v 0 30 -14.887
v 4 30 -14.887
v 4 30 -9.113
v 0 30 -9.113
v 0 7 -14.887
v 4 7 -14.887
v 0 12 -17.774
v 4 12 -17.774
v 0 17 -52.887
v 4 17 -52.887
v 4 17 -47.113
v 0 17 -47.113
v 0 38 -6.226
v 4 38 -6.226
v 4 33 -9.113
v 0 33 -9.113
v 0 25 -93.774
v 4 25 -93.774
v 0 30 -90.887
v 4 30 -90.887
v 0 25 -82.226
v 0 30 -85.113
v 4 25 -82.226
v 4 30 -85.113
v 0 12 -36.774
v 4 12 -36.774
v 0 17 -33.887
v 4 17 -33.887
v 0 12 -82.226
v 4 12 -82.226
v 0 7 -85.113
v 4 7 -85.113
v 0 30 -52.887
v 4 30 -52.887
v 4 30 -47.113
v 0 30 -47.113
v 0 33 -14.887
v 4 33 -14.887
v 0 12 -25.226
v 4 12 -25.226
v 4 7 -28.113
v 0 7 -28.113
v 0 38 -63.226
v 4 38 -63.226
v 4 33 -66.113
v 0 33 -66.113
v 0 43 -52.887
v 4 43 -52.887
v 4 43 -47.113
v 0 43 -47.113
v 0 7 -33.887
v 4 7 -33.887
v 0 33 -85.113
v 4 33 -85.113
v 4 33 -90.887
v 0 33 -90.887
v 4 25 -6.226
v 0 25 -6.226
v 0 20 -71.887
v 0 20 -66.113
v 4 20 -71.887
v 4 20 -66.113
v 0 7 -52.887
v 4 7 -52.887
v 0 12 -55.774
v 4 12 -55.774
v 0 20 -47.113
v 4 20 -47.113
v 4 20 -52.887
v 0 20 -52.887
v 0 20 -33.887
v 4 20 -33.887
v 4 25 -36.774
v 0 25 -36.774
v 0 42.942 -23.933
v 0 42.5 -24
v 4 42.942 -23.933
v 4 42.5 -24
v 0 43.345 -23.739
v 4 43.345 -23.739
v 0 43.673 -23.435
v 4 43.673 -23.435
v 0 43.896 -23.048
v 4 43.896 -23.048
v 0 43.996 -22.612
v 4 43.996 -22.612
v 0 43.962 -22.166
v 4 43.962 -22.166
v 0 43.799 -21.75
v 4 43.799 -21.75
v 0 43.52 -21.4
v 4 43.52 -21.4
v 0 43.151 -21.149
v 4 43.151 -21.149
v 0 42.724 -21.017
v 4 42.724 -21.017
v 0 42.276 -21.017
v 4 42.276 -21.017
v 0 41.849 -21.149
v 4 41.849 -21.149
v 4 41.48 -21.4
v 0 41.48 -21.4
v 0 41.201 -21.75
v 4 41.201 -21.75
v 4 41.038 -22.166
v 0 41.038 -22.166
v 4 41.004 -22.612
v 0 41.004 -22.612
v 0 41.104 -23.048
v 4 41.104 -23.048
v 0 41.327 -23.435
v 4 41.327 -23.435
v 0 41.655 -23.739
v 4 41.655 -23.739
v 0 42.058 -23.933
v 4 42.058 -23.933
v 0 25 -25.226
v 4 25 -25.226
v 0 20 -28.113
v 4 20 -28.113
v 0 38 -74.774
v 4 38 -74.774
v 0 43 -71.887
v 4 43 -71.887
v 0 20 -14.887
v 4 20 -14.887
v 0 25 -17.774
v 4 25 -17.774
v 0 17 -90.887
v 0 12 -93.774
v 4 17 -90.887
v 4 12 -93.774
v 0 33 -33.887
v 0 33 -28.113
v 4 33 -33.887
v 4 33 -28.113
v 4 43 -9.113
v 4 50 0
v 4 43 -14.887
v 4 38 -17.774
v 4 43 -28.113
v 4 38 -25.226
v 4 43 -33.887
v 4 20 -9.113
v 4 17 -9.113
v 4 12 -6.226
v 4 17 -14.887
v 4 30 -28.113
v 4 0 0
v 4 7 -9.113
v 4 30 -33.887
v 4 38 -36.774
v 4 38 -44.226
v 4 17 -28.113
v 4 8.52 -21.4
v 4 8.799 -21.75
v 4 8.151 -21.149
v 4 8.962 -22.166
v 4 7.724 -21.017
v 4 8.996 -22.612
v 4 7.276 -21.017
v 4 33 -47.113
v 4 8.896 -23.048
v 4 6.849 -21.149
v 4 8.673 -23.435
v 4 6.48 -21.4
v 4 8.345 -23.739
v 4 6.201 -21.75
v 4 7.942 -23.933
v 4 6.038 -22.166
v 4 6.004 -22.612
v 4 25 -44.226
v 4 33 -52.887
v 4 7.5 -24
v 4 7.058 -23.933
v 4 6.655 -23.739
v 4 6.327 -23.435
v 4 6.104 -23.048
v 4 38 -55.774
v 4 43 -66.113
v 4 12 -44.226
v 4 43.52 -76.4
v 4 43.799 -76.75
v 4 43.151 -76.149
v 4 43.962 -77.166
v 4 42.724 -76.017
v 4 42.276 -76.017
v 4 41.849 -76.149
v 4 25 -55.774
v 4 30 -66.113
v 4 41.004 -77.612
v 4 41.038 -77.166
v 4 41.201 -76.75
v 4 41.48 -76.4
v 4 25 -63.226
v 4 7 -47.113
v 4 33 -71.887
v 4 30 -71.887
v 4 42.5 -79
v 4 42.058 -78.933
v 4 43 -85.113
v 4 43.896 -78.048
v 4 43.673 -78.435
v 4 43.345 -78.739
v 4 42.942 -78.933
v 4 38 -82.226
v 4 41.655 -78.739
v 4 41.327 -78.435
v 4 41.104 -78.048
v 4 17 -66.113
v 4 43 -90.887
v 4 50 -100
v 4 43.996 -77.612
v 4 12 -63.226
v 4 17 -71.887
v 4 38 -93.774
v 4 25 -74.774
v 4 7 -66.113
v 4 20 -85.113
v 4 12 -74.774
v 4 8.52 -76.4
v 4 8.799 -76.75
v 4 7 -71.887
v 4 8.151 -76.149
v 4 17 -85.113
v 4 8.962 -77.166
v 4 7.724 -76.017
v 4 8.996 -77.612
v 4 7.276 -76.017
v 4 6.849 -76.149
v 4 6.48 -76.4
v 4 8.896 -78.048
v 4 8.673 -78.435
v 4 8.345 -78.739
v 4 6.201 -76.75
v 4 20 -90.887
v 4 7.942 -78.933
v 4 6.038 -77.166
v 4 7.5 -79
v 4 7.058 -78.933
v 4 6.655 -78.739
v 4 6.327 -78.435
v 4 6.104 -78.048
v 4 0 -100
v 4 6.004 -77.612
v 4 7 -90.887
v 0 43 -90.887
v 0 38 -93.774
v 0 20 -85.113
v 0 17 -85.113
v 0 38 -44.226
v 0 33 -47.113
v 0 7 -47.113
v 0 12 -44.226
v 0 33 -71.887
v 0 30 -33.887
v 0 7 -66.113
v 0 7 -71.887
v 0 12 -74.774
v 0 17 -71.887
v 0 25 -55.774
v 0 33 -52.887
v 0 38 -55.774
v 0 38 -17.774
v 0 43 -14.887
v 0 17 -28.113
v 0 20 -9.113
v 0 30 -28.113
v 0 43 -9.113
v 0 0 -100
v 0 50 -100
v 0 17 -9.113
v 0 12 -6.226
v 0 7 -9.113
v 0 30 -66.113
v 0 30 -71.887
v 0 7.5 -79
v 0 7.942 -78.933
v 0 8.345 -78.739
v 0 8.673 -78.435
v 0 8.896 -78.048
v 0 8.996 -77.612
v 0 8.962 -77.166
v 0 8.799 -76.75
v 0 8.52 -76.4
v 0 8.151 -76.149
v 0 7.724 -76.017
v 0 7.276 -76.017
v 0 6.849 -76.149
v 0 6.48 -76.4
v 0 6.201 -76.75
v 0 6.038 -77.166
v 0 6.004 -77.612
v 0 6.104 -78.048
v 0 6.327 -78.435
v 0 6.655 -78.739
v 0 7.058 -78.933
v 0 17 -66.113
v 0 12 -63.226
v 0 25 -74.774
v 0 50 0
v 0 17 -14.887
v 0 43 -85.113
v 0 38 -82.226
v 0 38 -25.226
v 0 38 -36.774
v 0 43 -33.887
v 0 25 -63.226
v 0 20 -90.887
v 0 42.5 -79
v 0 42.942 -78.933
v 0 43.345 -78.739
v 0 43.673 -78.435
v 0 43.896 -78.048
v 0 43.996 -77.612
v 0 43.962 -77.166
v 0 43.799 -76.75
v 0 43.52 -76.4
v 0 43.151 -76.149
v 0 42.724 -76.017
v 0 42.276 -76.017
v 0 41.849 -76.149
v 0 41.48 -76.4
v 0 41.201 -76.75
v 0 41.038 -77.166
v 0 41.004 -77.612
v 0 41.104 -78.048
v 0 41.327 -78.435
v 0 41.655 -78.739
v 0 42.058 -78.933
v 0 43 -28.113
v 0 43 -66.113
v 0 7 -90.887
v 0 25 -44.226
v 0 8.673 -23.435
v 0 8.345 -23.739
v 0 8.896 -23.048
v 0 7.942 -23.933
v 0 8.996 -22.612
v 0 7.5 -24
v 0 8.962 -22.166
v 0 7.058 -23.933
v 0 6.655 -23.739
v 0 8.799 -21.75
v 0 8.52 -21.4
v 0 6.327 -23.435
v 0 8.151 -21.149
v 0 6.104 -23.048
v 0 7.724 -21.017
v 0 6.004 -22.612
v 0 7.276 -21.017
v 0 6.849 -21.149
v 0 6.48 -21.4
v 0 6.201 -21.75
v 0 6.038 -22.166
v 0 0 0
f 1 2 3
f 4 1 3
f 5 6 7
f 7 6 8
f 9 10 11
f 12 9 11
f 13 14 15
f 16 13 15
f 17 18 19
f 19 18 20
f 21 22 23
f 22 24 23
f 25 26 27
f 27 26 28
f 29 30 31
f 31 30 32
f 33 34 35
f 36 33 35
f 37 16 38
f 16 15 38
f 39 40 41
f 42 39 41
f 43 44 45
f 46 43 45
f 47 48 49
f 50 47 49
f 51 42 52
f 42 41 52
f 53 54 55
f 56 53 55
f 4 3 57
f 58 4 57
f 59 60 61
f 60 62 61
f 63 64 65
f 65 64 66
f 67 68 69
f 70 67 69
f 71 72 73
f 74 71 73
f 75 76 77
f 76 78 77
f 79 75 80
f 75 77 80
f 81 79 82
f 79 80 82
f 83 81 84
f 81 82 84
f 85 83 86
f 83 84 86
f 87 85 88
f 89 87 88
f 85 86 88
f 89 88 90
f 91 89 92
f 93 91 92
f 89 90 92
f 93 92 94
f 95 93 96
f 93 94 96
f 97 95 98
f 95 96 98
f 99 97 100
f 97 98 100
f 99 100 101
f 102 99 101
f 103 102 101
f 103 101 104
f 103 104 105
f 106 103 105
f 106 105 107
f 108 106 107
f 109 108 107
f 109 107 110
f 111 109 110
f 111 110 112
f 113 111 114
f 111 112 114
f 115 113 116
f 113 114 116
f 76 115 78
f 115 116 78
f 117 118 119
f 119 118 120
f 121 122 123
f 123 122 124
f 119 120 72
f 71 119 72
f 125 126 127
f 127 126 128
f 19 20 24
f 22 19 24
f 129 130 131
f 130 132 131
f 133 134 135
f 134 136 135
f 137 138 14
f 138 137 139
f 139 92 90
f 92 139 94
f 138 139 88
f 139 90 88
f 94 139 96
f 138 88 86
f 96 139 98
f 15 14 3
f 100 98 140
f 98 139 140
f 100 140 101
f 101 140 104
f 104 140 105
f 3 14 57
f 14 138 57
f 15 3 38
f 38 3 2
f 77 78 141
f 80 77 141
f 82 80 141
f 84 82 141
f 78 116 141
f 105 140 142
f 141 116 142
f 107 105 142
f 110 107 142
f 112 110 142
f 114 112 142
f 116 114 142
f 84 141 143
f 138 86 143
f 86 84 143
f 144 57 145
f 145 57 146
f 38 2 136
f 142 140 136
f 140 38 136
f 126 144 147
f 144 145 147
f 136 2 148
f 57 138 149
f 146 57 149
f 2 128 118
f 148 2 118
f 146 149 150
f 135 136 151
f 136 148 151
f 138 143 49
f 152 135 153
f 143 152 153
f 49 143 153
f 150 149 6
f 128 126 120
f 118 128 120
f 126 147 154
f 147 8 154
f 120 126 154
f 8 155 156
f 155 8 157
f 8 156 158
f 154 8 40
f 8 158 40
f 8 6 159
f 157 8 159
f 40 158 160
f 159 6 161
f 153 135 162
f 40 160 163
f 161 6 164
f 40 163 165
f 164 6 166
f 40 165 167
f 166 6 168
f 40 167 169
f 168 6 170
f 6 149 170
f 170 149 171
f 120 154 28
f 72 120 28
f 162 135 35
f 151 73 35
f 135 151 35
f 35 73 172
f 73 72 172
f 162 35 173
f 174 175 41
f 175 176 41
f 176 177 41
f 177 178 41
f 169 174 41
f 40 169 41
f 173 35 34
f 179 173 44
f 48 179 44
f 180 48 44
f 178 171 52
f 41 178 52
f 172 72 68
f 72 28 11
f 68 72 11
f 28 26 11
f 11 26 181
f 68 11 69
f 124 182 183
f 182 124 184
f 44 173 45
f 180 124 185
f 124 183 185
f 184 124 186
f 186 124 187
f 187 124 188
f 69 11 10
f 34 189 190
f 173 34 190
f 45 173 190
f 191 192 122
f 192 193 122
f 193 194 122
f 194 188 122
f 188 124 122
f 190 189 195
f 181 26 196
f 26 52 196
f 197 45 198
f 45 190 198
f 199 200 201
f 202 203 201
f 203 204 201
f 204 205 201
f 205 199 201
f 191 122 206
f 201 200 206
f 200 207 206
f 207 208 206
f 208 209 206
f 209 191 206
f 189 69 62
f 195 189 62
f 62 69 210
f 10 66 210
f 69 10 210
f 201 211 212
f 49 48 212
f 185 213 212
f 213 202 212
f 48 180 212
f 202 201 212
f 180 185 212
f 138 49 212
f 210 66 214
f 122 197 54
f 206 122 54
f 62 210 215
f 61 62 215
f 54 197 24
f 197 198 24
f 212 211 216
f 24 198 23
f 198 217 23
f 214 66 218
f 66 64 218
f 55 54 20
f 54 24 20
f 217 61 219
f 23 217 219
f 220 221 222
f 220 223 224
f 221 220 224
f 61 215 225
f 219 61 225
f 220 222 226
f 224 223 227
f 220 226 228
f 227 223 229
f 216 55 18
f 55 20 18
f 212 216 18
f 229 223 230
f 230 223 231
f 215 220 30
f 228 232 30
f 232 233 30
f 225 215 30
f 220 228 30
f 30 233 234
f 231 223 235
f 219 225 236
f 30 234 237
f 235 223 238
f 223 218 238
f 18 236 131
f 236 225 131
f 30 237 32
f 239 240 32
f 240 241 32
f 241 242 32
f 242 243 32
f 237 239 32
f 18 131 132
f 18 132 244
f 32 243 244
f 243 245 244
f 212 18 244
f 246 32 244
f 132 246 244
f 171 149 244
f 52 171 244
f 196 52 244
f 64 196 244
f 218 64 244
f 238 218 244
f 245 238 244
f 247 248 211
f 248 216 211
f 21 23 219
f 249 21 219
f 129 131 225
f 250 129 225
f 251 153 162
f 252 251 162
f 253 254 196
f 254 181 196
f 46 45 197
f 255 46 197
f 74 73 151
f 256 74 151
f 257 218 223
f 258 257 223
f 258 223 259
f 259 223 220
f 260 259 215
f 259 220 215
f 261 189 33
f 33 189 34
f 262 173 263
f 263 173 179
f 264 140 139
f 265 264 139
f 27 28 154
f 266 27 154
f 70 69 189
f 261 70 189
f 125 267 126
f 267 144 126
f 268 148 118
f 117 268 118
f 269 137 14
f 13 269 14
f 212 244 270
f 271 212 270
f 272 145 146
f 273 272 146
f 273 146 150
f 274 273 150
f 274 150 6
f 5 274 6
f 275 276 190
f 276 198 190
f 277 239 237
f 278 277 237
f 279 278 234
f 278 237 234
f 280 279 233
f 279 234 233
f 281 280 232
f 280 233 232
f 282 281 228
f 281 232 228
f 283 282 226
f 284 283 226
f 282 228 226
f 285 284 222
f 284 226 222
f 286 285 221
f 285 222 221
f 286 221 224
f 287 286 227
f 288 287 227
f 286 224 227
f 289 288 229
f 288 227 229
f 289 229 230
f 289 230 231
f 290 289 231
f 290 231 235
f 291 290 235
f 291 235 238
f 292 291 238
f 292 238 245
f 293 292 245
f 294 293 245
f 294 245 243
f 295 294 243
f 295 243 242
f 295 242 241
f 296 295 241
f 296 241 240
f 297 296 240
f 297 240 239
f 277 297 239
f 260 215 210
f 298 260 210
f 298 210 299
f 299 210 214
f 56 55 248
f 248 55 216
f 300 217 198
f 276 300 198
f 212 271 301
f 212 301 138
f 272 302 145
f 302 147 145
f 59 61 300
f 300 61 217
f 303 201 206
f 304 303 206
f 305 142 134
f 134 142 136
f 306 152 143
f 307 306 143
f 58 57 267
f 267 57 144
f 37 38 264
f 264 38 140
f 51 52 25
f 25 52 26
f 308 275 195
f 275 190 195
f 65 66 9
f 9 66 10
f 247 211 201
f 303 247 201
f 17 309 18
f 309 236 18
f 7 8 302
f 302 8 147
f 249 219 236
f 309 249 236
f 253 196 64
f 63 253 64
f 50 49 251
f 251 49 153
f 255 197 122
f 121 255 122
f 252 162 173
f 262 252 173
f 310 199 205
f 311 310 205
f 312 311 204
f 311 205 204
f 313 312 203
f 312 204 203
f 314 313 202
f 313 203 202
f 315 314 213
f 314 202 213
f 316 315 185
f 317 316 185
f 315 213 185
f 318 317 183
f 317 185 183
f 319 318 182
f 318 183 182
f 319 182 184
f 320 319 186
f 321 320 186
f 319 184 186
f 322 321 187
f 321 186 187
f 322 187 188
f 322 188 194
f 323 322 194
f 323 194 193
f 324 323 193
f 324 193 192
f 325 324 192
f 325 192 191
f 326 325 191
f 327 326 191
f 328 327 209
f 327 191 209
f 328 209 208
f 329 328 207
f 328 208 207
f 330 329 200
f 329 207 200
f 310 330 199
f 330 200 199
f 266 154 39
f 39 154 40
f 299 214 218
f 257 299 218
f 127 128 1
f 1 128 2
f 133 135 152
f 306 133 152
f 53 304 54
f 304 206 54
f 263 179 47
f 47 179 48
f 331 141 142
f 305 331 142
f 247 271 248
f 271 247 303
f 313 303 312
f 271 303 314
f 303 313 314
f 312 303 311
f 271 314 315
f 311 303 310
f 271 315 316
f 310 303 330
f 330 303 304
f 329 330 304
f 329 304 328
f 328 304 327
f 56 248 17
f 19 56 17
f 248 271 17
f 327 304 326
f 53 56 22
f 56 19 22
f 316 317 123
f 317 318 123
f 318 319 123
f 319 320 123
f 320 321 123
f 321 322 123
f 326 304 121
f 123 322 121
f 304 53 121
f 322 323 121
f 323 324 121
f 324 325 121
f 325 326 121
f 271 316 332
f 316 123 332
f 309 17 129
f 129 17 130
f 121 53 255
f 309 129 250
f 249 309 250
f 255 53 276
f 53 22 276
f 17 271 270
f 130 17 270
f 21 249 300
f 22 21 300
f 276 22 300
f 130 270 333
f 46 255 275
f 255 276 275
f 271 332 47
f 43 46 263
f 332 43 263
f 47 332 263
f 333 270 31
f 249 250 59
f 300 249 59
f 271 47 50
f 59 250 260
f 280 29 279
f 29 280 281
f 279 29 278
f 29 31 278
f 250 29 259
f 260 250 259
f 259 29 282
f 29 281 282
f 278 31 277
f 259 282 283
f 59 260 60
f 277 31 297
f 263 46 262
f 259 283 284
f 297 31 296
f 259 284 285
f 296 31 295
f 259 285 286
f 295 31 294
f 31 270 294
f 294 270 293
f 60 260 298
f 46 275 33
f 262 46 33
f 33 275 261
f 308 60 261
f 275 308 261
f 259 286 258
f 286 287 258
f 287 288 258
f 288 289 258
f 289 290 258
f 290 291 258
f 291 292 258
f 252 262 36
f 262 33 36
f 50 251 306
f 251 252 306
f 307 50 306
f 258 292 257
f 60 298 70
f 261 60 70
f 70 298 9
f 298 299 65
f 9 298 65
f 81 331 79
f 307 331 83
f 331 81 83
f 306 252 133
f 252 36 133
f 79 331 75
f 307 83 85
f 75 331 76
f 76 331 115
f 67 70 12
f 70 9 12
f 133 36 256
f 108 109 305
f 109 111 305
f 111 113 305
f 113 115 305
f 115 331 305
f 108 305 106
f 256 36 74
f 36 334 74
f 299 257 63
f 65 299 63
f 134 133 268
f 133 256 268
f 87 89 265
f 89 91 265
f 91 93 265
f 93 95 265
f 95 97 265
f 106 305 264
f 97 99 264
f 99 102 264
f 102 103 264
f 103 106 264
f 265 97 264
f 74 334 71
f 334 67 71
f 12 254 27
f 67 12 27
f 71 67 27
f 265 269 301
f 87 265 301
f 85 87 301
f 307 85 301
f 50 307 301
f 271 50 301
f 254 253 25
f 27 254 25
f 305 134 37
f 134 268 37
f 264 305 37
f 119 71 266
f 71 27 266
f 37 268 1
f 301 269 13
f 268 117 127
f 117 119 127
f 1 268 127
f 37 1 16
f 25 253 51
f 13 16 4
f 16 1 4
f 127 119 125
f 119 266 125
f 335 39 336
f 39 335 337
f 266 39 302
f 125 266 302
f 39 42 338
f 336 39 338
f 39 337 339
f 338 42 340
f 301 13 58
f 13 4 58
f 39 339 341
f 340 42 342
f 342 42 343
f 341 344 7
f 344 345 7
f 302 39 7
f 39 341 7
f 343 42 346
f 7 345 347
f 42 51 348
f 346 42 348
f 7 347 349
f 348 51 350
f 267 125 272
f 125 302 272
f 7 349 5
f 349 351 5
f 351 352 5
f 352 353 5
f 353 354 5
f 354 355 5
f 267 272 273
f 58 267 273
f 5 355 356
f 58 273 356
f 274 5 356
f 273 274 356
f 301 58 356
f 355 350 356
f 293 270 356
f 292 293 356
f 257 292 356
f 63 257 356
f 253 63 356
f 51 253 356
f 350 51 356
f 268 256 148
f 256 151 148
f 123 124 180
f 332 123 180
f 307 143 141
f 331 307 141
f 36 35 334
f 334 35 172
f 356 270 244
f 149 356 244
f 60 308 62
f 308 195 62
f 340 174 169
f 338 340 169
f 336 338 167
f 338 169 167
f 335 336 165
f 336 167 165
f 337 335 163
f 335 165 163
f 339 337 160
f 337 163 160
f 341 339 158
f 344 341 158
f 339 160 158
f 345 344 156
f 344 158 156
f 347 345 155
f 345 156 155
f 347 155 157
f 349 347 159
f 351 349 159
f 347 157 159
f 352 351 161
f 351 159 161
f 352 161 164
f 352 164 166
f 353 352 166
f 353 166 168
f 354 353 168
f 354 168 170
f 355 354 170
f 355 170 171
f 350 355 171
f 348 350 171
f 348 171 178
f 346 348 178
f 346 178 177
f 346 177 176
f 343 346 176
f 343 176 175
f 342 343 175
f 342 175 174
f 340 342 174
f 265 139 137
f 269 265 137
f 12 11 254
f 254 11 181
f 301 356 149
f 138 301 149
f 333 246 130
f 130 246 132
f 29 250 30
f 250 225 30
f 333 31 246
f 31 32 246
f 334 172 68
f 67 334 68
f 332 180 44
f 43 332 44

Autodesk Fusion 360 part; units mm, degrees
sketch "Boceto1" plane through (0, 0, 0) normal (0, 1, 0) x (1, 0, 0)
  line L0 (0, 0) -> (4, 0)
  line L1 (4, 0) -> (4, 100)
  line L2 (4, 100) -> (0, 100)
  line L3 (0, 100) -> (0, 0)
  dimension "d1" = 4
  dimension "d2" = 100
extrude "Extruir1" add sketch "Boceto1" along normal blind 50
sketch "Boceto2" plane through (4, 0, 0) normal (1, 0, 0) x (0, 0, -1)
  line L0 (0, 0) -> (100, 0)
  line L1 (100, 0) -> (100, 50)
  line L2 (100, 50) -> (0, 50)
  line L3 (0, 50) -> (0, 0)
  line L4 (0, 0) -> (0, 7.5)
  line L5 (0, 7.5) -> (22.5, 7.5)
  line L6 (22.5, 7.5) -> (77.5, 7.5)
  line L7 (77.5, 7.5) -> (77.5, 42.5)
  line L8 (77.5, 42.5) -> (22.5, 42.5)
  circle A0 centre (22.5, 42.5) radius 1.5
  circle A1 centre (77.5, 42.5) radius 1.5
  circle A2 centre (22.5, 7.5) radius 1.5
  circle A3 centre (77.5, 7.5) radius 1.5
  line L9 (0, 50) -> (4, 50)
  line L10 (4, 50) -> (4, 46)
  line L11 (4, 46) -> (96, 46)
  line L12 (96, 46) -> (96, 4)
  line L13 (96, 4) -> (4, 4)
  line L14 (4, 4) -> (4, 46)
  line L15 (50, 46) -> (50, 25)
  line L16 (47.1132, 30) -> (44.2265, 25)
  line L17 (44.2265, 25) -> (47.1132, 20)
  line L18 (47.1132, 20) -> (52.8868, 20)
  line L19 (52.8868, 20) -> (55.7735, 25)
  line L20 (55.7735, 25) -> (52.8868, 30)
  line L21 (52.8868, 30) -> (47.1132, 30)
  line L22 (9.1132, 30) -> (6.2265, 25)
  line L23 (9.1132, 20) -> (14.8868, 20)
  line L24 (14.8868, 20) -> (17.7735, 25)
  line L25 (6.2265, 25) -> (9.1132, 20)
  line L26 (17.7735, 25) -> (14.8868, 30)
  line L27 (14.8868, 30) -> (9.1132, 30)
  line L28 (28.1132, 30) -> (25.2265, 25)
  line L29 (28.1132, 20) -> (33.8868, 20)
  line L30 (33.8868, 20) -> (36.7735, 25)
  line L31 (25.2265, 25) -> (28.1132, 20)
  line L32 (36.7735, 25) -> (33.8868, 30)
  line L33 (33.8868, 30) -> (28.1132, 30)
  line L34 (66.1132, 30) -> (63.2265, 25)
  line L35 (66.1132, 20) -> (71.8868, 20)
  line L36 (71.8868, 20) -> (74.7735, 25)
  line L37 (63.2265, 25) -> (66.1132, 20)
  line L38 (74.7735, 25) -> (71.8868, 30)
  line L39 (71.8868, 30) -> (66.1132, 30)
  line L40 (85.1132, 30) -> (82.2265, 25)
  line L41 (85.1132, 20) -> (90.8868, 20)
  line L42 (90.8868, 20) -> (93.7735, 25)
  line L43 (82.2265, 25) -> (85.1132, 20)
  line L44 (93.7735, 25) -> (90.8868, 30)
  line L45 (90.8868, 30) -> (85.1132, 30)
  line L46 (17.7735, 12) -> (14.8868, 17)
  line L47 (85.1132, 17) -> (82.2265, 12)
  line L48 (14.8868, 17) -> (9.1132, 17)
  line L49 (90.8868, 7) -> (93.7735, 12)
  line L50 (47.1132, 7) -> (52.8868, 7)
  line L51 (28.1132, 17) -> (25.2265, 12)
  line L52 (47.1132, 17) -> (44.2265, 12)
  line L53 (85.1132, 7) -> (90.8868, 7)
  line L54 (52.8868, 7) -> (55.7735, 12)
  line L55 (63.2265, 12) -> (66.1132, 7)
  line L56 (9.1132, 7) -> (14.8868, 7)
  line L57 (14.8868, 7) -> (17.7735, 12)
  line L58 (52.8868, 17) -> (47.1132, 17)
  line L59 (74.7735, 12) -> (71.8868, 17)
  line L60 (28.1132, 7) -> (33.8868, 7)
  line L61 (36.7735, 12) -> (33.8868, 17)
  line L62 (82.2265, 12) -> (85.1132, 7)
  line L63 (71.8868, 17) -> (66.1132, 17)
  line L64 (33.8868, 17) -> (28.1132, 17)
  line L65 (93.7735, 12) -> (90.8868, 17)
  line L66 (9.1132, 17) -> (6.2265, 12)
  line L67 (33.8868, 7) -> (36.7735, 12)
  line L68 (25.2265, 12) -> (28.1132, 7)
  line L69 (71.8868, 7) -> (74.7735, 12)
  line L70 (55.7735, 12) -> (52.8868, 17)
  line L71 (6.2265, 12) -> (9.1132, 7)
  line L72 (66.1132, 7) -> (71.8868, 7)
  line L73 (66.1132, 17) -> (63.2265, 12)
  line L74 (44.2265, 12) -> (47.1132, 7)
  line L75 (90.8868, 17) -> (85.1132, 17)
  line L76 (17.7735, 38) -> (14.8868, 43)
  line L77 (85.1132, 43) -> (82.2265, 38)
  line L78 (14.8868, 43) -> (9.1132, 43)
  line L79 (90.8868, 33) -> (93.7735, 38)
  line L80 (47.1132, 33) -> (52.8868, 33)
  line L81 (28.1132, 43) -> (25.2265, 38)
  line L82 (47.1132, 43) -> (44.2265, 38)
  line L83 (85.1132, 33) -> (90.8868, 33)
  line L84 (52.8868, 33) -> (55.7735, 38)
  line L85 (63.2265, 38) -> (66.1132, 33)
  line L86 (9.1132, 33) -> (14.8868, 33)
  line L87 (14.8868, 33) -> (17.7735, 38)
  line L88 (52.8868, 43) -> (47.1132, 43)
  line L89 (74.7735, 38) -> (71.8868, 43)
  line L90 (28.1132, 33) -> (33.8868, 33)
  line L91 (36.7735, 38) -> (33.8868, 43)
  line L92 (82.2265, 38) -> (85.1132, 33)
  line L93 (71.8868, 43) -> (66.1132, 43)
  line L94 (33.8868, 43) -> (28.1132, 43)
  line L95 (93.7735, 38) -> (90.8868, 43)
  line L96 (9.1132, 43) -> (6.2265, 38)
  line L97 (33.8868, 33) -> (36.7735, 38)
  line L98 (25.2265, 38) -> (28.1132, 33)
  line L99 (71.8868, 33) -> (74.7735, 38)
  line L100 (55.7735, 38) -> (52.8868, 43)
  line L101 (6.2265, 38) -> (9.1132, 33)
  line L102 (66.1132, 33) -> (71.8868, 33)
  line L103 (66.1132, 43) -> (63.2265, 38)
  line L104 (44.2265, 38) -> (47.1132, 33)
  line L105 (90.8868, 43) -> (85.1132, 43)
  point P0 (50, 25)
  point P1 (12, 25)
  point P2 (12, 25)
  point P3 (31, 25)
  point P4 (31, 25)
  point P5 (69, 25)
  point P6 (69, 25)
  point P7 (88, 25)
  point P8 (88, 25)
  point P9 (12, 12)
  point P10 (50, 12)
  point P11 (69, 12)
  point P12 (31, 12)
  point P13 (88, 12)
  point P14 (50, 12)
  point P15 (31, 12)
  point P16 (88, 12)
  point P17 (69, 12)
  point P18 (12, 12)
  point P19 (12, 38)
  point P20 (50, 38)
  point P21 (69, 38)
  point P22 (31, 38)
  point P23 (88, 38)
  point P24 (50, 38)
  point P25 (31, 38)
  point P26 (88, 38)
  point P27 (69, 38)
  point P28 (12, 38)
  dimension "d5" = 7.5
  dimension "d6" = 22.5
  dimension "d7" = 55
  dimension "d8" = 35
  dimension "d9" = 3
  dimension "d10" = 3
  dimension "d11" = 3
  dimension "d12" = 3
  dimension "d13" = 4
  dimension "d14" = 4
  dimension "d15" = 92
  dimension "d16" = 42
  dimension "d17" = 5
  dimension "d20" = 38
  dimension "d21" = 0
  dimension "d24" = 0
  dimension "d25" = 13
extrude "Extruir2" cut sketch "Boceto2" against normal blind 13 contours L16 L17 L18 L19 L20 L21 | A0 | L8 L81 L90 L91 L97 L98 | L8 L81 L91 L94 | L5 L46 L48 L57 L66 L71 | L5 L56 L57 L71 | L5 L6 A2 | L5 L6 A2 | L8 L15 L88 L100 | L8 L15 L82 L88 | L8 L15 L80 L82 L104 | L8 L15 L80 L84 L100 | L6 L51 L61 L64 L67 L68 | L6 L60 L67 L68 | L8 L89 L93 L103 | L8 L85 L89 L99 L102 L103 | L6 L52 L54 L58 L70 L74 | L6 L50 L54 L74 | L7 L8 A1 | L7 L8 A1 | L6 L55 L59 L63 L69 L73 | L6 L55 L69 L72 | L6 L7 A3 | L6 L7 A3 | L22 L23 L24 L25 L26 L27 | L28 L29 L30 L31 L32 L33 | L34 L35 L36 L37 L38 L39 | L40 L41 L42 L43 L44 L45 | L47 L49 L53 L62 L65 L75 | L76 L78 L86 L87 L96 L101 | L77 L79 L83 L92 L95 L105
sketch "Boceto3" plane through (4, 0, 0) normal (1, 0, 0) x (0, 0, -1)
  line L0 (52.8868, 7) -> (47.1132, 7)
  line L1 (47.1132, 7) -> (44.2265, 12)
  line L2 (44.2265, 12) -> (47.1132, 17)
  line L3 (47.1132, 17) -> (52.8868, 17)
  line L4 (52.8868, 17) -> (55.7735, 12)
  line L5 (55.7735, 12) -> (52.8868, 7)
  line L6 (14.8868, 33) -> (9.1132, 33)
  line L7 (9.1132, 33) -> (6.2265, 38)
  line L8 (6.2265, 38) -> (9.1132, 43)
  line L9 (9.1132, 43) -> (14.8868, 43)
  line L10 (14.8868, 43) -> (17.7735, 38)
  line L11 (17.7735, 38) -> (14.8868, 33)
  line L12 (63.2265, 25) -> (66.1132, 30)
  line L13 (66.1132, 30) -> (71.8868, 30)
  line L14 (71.8868, 30) -> (74.7735, 25)
  line L15 (74.7735, 25) -> (71.8868, 20)
  line L16 (71.8868, 20) -> (66.1132, 20)
  line L17 (66.1132, 20) -> (63.2265, 25)
  circle A0 centre (77.5, 42.5) radius 1.5
  circle A1 centre (22.5, 42.5) radius 1.5
  line L18 (66.1132, 33) -> (63.2265, 38)
  line L19 (63.2265, 38) -> (66.1132, 43)
  line L20 (66.1132, 43) -> (71.8868, 43)
  line L21 (71.8868, 43) -> (74.7735, 38)
  line L22 (74.7735, 38) -> (71.8868, 33)
  line L23 (71.8868, 33) -> (66.1132, 33)
  line L24 (82.2265, 12) -> (85.1132, 17)
  line L25 (85.1132, 17) -> (90.8868, 17)
  line L26 (90.8868, 17) -> (93.7735, 12)
  line L27 (93.7735, 12) -> (90.8868, 7)
  line L28 (90.8868, 7) -> (85.1132, 7)
  line L29 (85.1132, 7) -> (82.2265, 12)
  line L30 (6.2265, 25) -> (9.1132, 30)
  line L31 (9.1132, 30) -> (14.8868, 30)
  line L32 (14.8868, 30) -> (17.7735, 25)
  line L33 (17.7735, 25) -> (14.8868, 20)
  line L34 (14.8868, 20) -> (9.1132, 20)
  line L35 (9.1132, 20) -> (6.2265, 25)
  line L36 (33.8868, 7) -> (28.1132, 7)
  line L37 (28.1132, 7) -> (25.2265, 12)
  line L38 (25.2265, 12) -> (28.1132, 17)
  line L39 (28.1132, 17) -> (33.8868, 17)
  line L40 (33.8868, 17) -> (36.7735, 12)
  line L41 (36.7735, 12) -> (33.8868, 7)
  line L42 (66.1132, 7) -> (63.2265, 12)
  line L43 (63.2265, 12) -> (66.1132, 17)
  line L44 (66.1132, 17) -> (71.8868, 17)
  line L45 (71.8868, 17) -> (74.7735, 12)
  line L46 (74.7735, 12) -> (71.8868, 7)
  line L47 (71.8868, 7) -> (66.1132, 7)
  line L48 (14.8868, 7) -> (9.1132, 7)
  line L49 (9.1132, 7) -> (6.2265, 12)
  line L50 (6.2265, 12) -> (9.1132, 17)
  line L51 (9.1132, 17) -> (14.8868, 17)
  line L52 (14.8868, 17) -> (17.7735, 12)
  line L53 (17.7735, 12) -> (14.8868, 7)
  line L54 (44.2265, 25) -> (47.1132, 30)
  line L55 (47.1132, 30) -> (52.8868, 30)
  line L56 (52.8868, 30) -> (55.7735, 25)
  line L57 (55.7735, 25) -> (52.8868, 20)
  line L58 (52.8868, 20) -> (47.1132, 20)
  line L59 (47.1132, 20) -> (44.2265, 25)
  line L60 (82.2265, 38) -> (85.1132, 43)
  line L61 (85.1132, 43) -> (90.8868, 43)
  line L62 (90.8868, 43) -> (93.7735, 38)
  line L63 (93.7735, 38) -> (90.8868, 33)
  line L64 (90.8868, 33) -> (85.1132, 33)
  line L65 (85.1132, 33) -> (82.2265, 38)
  line L66 (33.8868, 33) -> (28.1132, 33)
  line L67 (28.1132, 33) -> (25.2265, 38)
  line L68 (25.2265, 38) -> (28.1132, 43)
  line L69 (28.1132, 43) -> (33.8868, 43)
  line L70 (33.8868, 43) -> (36.7735, 38)
  line L71 (36.7735, 38) -> (33.8868, 33)
  line L72 (52.8868, 33) -> (47.1132, 33)
  line L73 (47.1132, 33) -> (44.2265, 38)
  line L74 (44.2265, 38) -> (47.1132, 43)
  line L75 (47.1132, 43) -> (52.8868, 43)
  line L76 (52.8868, 43) -> (55.7735, 38)
  line L77 (55.7735, 38) -> (52.8868, 33)
  line L78 (82.2265, 25) -> (85.1132, 30)
  line L79 (85.1132, 30) -> (90.8868, 30)
  line L80 (90.8868, 30) -> (93.7735, 25)
  line L81 (93.7735, 25) -> (90.8868, 20)
  line L82 (90.8868, 20) -> (85.1132, 20)
  line L83 (85.1132, 20) -> (82.2265, 25)
  line L84 (25.2265, 25) -> (28.1132, 30)
  line L85 (28.1132, 30) -> (33.8868, 30)
  line L86 (33.8868, 30) -> (36.7735, 25)
  line L87 (36.7735, 25) -> (33.8868, 20)
  line L88 (33.8868, 20) -> (28.1132, 20)
  line L89 (28.1132, 20) -> (25.2265, 25)
  circle A2 centre (22.5, 7.5) radius 1.5
  circle A3 centre (77.5, 7.5) radius 1.5
  line L90 (0, 0) -> (100, 0)
  line L91 (100, 0) -> (100, 50)
  line L92 (100, 50) -> (0, 50)
  line L93 (0, 50) -> (0, 0)
